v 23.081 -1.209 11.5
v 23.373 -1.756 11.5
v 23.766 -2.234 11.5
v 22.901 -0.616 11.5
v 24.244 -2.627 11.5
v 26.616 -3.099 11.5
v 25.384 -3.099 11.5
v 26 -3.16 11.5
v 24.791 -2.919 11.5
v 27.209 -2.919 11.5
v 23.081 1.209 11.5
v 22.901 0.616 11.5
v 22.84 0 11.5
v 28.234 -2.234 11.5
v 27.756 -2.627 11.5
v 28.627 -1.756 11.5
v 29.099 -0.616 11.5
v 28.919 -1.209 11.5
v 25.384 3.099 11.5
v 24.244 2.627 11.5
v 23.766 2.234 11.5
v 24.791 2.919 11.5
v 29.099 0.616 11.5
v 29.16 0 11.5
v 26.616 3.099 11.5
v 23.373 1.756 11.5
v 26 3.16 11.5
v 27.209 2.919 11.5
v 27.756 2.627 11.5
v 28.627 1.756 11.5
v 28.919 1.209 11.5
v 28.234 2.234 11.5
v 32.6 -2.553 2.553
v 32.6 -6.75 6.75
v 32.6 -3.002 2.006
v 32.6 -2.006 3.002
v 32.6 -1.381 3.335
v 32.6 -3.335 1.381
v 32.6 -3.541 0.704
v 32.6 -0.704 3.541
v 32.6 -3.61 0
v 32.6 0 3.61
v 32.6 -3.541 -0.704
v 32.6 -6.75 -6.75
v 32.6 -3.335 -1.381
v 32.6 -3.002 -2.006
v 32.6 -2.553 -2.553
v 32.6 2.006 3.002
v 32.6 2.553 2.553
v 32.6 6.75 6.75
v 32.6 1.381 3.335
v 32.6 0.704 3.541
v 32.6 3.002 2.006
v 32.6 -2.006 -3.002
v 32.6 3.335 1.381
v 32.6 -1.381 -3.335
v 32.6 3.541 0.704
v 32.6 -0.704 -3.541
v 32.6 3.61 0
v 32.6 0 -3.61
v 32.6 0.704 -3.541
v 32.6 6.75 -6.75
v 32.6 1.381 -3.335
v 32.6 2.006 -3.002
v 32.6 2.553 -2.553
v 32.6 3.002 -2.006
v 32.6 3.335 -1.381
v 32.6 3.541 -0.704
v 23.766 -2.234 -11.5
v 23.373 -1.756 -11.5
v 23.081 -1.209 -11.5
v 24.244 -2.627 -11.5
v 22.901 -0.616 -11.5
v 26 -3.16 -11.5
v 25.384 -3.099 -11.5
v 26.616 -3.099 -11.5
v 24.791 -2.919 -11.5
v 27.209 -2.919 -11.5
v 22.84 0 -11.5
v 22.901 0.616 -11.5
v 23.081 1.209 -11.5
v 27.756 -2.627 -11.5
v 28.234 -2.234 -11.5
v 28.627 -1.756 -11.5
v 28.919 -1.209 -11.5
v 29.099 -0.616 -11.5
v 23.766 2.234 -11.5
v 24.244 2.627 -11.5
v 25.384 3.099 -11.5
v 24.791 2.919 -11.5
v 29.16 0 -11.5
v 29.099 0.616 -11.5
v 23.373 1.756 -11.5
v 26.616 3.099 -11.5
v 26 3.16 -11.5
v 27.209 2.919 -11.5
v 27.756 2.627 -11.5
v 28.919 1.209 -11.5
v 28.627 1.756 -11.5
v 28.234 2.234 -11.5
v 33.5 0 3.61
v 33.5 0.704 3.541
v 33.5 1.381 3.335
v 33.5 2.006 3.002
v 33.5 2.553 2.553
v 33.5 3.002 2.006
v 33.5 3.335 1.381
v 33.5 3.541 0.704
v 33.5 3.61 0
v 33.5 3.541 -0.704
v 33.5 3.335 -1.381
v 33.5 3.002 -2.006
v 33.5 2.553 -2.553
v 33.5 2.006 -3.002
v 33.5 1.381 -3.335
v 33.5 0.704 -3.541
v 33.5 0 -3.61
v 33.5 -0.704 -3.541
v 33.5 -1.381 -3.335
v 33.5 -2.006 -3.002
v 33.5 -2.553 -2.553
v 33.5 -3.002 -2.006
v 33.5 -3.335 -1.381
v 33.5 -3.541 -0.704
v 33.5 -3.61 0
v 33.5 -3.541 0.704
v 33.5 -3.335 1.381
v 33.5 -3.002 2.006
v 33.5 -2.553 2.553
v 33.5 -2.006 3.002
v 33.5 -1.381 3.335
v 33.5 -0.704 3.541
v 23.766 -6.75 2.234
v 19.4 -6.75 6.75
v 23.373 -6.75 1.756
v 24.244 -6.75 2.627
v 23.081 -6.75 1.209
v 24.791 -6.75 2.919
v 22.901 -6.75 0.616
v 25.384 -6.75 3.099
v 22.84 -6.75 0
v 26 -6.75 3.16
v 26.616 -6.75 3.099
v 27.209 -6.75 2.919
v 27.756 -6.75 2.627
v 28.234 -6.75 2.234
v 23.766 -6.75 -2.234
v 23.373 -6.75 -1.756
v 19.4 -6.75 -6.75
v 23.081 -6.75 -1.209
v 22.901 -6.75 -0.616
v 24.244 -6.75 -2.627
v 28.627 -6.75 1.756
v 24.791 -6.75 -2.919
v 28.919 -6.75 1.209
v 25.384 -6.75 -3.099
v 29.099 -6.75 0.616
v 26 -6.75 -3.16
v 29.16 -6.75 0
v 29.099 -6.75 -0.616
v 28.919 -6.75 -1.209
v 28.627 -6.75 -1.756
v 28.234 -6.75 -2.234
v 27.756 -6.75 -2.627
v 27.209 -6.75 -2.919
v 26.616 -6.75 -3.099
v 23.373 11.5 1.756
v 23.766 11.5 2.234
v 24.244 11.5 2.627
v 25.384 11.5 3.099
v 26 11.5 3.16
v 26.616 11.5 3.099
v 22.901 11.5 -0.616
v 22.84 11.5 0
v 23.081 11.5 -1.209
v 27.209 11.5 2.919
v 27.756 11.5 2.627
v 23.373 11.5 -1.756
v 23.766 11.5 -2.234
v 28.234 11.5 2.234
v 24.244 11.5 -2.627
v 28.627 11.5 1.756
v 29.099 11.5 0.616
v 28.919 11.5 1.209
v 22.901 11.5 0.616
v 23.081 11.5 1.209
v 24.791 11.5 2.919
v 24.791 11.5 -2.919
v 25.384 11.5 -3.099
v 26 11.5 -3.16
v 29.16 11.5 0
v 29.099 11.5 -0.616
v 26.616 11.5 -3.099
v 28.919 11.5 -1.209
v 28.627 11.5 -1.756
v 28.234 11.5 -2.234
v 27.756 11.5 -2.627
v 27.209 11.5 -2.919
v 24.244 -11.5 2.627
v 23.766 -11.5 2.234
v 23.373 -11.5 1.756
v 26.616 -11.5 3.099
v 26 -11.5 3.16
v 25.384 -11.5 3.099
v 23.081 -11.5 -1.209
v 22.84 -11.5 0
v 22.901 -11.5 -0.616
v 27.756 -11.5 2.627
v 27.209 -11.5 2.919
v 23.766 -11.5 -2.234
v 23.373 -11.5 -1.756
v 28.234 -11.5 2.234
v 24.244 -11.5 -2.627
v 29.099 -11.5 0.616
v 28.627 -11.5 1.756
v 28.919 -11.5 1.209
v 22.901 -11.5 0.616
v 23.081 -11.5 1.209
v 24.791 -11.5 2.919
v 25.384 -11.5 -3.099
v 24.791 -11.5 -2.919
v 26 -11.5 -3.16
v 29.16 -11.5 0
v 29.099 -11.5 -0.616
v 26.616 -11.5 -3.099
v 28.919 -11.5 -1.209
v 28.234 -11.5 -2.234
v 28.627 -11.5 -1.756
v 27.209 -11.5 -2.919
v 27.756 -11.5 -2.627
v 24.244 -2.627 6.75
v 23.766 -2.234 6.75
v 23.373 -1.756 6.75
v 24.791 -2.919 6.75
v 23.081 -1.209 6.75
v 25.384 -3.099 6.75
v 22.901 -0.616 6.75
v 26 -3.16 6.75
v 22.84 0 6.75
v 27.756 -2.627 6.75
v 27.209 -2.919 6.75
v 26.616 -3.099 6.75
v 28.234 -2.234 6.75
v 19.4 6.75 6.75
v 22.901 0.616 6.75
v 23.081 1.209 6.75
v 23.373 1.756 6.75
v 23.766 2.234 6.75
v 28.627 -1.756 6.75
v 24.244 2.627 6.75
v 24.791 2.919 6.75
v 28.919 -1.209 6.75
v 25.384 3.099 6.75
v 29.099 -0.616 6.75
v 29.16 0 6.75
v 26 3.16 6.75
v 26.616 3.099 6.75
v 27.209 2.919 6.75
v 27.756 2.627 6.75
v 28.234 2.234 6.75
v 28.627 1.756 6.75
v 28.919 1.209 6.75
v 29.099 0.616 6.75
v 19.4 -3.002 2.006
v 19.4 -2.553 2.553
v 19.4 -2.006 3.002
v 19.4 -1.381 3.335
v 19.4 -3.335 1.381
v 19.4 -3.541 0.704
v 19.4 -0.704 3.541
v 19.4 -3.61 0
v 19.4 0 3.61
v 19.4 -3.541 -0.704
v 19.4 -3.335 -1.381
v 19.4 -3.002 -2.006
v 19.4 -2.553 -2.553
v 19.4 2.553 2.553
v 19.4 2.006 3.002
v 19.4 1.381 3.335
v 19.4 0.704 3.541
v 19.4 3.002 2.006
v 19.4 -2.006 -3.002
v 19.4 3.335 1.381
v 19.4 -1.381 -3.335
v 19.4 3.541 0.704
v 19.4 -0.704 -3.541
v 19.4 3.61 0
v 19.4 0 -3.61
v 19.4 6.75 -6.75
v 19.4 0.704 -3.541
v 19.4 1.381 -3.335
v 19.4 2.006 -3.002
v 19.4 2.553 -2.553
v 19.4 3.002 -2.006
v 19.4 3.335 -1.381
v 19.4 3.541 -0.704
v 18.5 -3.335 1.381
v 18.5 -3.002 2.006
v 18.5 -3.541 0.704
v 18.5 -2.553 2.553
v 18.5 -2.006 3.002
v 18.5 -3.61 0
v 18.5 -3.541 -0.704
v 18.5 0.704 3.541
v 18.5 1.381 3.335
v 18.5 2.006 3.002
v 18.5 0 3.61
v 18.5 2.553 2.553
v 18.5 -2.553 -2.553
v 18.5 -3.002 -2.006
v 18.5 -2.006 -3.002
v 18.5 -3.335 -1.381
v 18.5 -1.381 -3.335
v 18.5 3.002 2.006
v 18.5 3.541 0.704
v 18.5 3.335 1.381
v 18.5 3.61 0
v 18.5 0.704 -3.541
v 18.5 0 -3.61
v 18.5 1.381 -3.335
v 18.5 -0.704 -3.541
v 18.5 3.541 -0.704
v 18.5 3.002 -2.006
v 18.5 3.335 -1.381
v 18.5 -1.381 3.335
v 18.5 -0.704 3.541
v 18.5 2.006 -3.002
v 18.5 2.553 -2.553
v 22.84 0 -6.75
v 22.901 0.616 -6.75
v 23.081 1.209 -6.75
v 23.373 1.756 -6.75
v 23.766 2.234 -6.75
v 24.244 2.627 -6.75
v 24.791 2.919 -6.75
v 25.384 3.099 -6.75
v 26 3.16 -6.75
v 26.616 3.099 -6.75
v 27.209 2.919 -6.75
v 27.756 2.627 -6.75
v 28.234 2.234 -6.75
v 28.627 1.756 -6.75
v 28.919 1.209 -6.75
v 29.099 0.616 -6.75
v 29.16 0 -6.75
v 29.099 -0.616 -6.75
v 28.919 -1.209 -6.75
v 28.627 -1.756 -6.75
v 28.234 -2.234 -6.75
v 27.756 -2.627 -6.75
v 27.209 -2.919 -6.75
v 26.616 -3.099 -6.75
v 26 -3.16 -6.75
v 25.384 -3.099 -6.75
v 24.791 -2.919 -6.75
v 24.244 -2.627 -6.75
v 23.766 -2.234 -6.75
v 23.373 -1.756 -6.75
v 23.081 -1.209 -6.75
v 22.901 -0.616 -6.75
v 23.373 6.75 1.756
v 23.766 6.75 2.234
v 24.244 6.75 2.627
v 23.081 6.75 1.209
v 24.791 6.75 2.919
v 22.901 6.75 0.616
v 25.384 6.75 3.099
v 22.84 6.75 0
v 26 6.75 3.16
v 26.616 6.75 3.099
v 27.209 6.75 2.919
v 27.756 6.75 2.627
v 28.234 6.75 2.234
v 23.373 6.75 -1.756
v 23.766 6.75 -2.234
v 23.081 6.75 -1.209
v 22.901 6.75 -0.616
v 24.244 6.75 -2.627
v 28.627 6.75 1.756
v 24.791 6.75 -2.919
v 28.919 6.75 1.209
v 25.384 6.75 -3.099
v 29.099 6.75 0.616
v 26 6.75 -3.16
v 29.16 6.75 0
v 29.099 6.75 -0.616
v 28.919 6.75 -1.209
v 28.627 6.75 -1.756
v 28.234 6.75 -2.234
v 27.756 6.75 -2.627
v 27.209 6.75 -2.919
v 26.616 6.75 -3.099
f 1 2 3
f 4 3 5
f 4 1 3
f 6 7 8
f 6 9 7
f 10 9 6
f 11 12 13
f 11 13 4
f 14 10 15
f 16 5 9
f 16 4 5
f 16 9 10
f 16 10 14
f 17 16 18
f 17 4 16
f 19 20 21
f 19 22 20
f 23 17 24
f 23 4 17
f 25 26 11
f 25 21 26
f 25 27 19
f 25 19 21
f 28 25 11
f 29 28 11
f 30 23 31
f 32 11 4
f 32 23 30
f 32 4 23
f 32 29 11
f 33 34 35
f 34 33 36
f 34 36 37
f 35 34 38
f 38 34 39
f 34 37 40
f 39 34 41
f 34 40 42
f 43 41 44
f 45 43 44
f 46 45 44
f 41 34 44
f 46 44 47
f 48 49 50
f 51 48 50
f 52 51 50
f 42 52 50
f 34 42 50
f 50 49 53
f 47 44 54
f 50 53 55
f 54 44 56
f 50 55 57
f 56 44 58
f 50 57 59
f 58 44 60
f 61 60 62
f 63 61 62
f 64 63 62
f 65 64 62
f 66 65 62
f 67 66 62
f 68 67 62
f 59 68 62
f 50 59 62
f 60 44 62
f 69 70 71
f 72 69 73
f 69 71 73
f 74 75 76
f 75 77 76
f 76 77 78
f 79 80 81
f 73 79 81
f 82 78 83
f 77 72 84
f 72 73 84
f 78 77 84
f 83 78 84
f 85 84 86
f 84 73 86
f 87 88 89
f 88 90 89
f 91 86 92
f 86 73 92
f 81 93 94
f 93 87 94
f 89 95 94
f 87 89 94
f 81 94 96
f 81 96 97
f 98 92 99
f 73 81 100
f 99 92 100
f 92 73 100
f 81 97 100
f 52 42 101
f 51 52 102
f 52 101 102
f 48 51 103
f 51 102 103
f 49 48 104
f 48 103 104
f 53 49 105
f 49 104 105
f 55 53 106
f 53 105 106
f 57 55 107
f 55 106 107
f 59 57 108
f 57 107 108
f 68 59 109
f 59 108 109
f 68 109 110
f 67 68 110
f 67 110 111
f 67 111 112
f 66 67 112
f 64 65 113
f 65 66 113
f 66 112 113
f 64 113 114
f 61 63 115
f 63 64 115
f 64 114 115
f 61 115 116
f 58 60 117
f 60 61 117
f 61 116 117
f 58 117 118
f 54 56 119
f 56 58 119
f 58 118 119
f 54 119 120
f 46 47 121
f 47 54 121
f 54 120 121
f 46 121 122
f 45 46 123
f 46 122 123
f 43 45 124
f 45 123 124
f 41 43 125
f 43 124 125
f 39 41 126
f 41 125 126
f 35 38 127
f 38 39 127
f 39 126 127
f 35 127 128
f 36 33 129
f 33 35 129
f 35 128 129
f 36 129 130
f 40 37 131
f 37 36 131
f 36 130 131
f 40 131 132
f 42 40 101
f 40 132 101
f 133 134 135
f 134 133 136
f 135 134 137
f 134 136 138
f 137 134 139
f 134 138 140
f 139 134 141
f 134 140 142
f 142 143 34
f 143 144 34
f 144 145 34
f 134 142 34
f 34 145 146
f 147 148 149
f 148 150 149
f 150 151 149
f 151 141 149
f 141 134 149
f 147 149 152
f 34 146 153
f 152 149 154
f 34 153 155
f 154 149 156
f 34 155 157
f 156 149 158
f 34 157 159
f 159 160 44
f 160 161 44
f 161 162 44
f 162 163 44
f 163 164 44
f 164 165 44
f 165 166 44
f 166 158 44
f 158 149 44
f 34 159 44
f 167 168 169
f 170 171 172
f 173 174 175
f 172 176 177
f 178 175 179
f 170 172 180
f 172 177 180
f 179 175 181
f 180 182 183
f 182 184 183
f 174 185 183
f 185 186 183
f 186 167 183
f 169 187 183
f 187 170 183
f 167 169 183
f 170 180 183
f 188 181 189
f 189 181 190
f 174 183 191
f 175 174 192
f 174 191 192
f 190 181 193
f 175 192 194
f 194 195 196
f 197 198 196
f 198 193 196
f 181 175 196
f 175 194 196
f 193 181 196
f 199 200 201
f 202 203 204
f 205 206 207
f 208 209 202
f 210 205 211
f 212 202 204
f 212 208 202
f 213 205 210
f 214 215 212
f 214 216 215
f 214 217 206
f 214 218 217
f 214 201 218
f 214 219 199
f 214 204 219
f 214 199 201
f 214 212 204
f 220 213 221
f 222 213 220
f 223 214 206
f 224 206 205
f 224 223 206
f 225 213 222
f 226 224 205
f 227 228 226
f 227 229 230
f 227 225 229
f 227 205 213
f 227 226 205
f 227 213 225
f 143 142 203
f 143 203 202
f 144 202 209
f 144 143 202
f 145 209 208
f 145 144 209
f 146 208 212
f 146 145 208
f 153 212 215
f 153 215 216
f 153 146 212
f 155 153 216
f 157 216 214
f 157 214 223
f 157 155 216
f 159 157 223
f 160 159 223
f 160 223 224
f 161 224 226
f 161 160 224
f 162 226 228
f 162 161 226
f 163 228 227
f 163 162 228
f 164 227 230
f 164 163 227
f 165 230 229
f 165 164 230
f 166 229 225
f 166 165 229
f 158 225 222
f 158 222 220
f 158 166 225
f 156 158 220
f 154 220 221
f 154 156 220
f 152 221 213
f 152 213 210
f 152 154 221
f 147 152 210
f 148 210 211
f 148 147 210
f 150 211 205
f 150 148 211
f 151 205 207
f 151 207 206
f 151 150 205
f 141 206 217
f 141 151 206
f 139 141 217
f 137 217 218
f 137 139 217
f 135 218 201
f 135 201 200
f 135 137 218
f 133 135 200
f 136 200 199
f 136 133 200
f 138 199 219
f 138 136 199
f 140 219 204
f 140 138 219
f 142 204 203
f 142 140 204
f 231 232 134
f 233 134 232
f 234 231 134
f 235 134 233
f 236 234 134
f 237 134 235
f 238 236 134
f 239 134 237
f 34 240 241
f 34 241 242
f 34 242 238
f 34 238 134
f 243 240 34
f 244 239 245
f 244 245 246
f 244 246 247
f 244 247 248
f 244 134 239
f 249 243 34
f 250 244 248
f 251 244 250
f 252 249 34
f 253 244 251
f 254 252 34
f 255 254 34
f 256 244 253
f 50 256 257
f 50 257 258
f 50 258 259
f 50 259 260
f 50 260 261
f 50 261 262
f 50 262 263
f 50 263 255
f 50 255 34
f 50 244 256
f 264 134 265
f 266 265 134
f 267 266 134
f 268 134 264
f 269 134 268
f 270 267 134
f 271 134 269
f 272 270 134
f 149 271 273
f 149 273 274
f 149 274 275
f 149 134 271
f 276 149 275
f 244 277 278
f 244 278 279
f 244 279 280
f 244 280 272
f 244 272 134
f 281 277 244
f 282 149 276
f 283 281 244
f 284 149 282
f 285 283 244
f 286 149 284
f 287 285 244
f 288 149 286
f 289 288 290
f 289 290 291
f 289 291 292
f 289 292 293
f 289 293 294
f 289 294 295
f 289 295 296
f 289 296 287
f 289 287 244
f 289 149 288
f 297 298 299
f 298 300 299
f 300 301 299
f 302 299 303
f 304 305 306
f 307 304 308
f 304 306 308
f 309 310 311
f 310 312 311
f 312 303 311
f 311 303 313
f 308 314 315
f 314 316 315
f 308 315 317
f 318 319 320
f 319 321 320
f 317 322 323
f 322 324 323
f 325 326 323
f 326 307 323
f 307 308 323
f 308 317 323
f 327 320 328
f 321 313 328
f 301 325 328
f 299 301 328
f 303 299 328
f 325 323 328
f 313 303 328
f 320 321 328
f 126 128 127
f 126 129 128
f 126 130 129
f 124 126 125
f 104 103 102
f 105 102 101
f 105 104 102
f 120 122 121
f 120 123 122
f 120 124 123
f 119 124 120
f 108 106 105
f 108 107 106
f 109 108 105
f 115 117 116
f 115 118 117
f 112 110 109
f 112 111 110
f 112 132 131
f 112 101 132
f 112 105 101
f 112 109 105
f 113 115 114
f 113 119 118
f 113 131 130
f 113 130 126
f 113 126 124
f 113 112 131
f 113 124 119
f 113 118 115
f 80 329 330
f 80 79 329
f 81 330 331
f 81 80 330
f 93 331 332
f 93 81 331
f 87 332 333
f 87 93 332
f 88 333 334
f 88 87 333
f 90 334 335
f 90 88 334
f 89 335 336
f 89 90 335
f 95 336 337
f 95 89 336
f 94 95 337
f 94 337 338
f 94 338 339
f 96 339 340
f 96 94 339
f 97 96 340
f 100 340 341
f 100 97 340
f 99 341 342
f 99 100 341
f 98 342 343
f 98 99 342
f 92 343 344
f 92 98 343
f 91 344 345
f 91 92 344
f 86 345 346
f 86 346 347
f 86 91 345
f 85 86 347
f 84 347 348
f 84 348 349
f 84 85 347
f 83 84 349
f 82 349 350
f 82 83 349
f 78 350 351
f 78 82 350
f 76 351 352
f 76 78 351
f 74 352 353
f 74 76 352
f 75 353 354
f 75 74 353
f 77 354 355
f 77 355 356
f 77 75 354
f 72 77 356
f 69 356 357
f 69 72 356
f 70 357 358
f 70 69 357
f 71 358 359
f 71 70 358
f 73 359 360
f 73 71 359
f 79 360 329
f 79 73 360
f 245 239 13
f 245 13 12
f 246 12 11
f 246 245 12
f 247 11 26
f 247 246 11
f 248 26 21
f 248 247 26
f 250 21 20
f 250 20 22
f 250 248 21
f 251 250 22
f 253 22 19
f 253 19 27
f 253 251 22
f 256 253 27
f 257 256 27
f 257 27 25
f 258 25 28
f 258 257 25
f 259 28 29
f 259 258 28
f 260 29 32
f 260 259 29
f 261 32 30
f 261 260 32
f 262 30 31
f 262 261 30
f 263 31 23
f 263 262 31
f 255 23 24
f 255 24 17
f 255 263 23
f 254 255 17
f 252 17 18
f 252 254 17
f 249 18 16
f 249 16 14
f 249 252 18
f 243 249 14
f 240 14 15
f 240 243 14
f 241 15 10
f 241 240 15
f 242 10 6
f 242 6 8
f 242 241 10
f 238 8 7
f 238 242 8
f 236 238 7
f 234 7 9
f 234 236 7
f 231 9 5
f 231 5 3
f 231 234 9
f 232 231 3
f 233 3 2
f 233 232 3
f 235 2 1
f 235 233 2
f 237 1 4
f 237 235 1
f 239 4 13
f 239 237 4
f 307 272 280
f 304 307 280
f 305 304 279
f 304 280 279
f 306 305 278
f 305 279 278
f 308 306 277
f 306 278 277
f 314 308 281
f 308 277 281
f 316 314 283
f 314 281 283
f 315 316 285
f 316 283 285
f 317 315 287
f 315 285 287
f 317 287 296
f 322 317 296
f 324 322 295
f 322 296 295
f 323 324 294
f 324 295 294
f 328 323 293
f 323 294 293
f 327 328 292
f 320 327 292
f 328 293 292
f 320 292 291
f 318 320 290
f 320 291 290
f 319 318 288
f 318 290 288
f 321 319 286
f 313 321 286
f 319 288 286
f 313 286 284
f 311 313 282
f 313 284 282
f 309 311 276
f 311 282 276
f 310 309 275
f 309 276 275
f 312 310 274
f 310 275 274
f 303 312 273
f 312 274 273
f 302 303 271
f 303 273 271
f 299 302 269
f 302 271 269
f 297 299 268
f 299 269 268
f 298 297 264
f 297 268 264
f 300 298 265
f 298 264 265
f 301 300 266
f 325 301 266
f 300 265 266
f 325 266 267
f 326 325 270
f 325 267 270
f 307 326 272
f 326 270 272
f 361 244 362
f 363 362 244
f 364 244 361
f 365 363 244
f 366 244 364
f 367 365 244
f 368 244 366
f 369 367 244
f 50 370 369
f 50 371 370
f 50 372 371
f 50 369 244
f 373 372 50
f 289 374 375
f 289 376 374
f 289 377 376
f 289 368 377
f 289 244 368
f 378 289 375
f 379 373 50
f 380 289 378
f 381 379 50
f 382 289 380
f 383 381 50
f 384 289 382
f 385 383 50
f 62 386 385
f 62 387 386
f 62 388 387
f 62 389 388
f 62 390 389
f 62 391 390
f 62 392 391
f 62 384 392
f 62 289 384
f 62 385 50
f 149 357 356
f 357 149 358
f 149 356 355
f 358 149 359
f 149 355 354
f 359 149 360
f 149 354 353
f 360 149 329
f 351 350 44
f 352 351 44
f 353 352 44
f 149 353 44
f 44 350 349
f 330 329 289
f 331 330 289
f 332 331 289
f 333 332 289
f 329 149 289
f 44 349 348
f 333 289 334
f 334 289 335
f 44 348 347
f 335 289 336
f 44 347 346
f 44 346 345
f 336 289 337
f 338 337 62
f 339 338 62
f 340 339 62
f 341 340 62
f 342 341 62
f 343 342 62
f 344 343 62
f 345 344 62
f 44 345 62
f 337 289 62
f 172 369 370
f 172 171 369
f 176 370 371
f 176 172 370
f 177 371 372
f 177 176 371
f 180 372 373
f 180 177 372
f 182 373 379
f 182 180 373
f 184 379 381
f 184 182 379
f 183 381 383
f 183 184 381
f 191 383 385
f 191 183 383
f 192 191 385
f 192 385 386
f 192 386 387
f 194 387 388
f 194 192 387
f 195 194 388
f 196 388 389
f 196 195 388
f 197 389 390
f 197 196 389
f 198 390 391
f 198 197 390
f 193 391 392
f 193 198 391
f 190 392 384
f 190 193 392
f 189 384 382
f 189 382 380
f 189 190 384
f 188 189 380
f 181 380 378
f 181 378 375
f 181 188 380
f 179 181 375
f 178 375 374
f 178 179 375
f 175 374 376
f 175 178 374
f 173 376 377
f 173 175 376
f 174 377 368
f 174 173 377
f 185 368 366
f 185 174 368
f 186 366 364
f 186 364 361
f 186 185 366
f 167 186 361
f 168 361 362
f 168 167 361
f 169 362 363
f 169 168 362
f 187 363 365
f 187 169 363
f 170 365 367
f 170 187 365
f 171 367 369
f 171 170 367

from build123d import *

# Parameters (mm, degrees)
BOSS_EXTRUDE1_DEPTH      = 6.75
BOSS_EXTRUDE1_DEPTH_BACK = 6.75
SKETCH1_W                = 13.2
SKETCH1_H                = 13.5
SKETCH2_W                = 3.16
SKETCH2_H                = 23
SKETCH3_W                = 3.16
SKETCH3_H                = 23
SKETCH4_W                = 15
SKETCH4_H                = 3.61


with BuildPart() as part:
    # Sketch1 → Boss-Extrude1 (new, two sides: drawn at the far end of the back side and taken through both)
    with BuildSketch(Plane.XY.offset(-BOSS_EXTRUDE1_DEPTH_BACK)):
        with Locations((26, 0)):
            Rectangle(SKETCH1_W, SKETCH1_H)
    extrude(amount=BOSS_EXTRUDE1_DEPTH + BOSS_EXTRUDE1_DEPTH_BACK)

    # Sketch2 → Revolve1 (revolve)
    with BuildSketch(Plane.XY):
        with Locations((27.58, 0)):
            Rectangle(SKETCH2_W, SKETCH2_H)
    revolve(axis=Axis((26, -11.5, 0), (0, 1, 0)))

    # Sketch3 → Revolve2 (revolve)
    with BuildSketch(Plane(origin=(0, 0, 0), x_dir=(1, 0, 0), z_dir=(0, 1, 0))):
        with Locations((27.58, 0)):
            Rectangle(SKETCH3_W, SKETCH3_H)
    revolve(axis=Axis((26, 0, 11.5), (0, 0, -1)))

    # Sketch4 → Revolve3 (revolve)
    with BuildSketch(Plane.XY):
        with Locations((26, 1.805)):
            Rectangle(SKETCH4_W, SKETCH4_H)
    revolve(axis=Axis((33.5, 0, 0), (-1, 0, 0)))


solid = part.part
